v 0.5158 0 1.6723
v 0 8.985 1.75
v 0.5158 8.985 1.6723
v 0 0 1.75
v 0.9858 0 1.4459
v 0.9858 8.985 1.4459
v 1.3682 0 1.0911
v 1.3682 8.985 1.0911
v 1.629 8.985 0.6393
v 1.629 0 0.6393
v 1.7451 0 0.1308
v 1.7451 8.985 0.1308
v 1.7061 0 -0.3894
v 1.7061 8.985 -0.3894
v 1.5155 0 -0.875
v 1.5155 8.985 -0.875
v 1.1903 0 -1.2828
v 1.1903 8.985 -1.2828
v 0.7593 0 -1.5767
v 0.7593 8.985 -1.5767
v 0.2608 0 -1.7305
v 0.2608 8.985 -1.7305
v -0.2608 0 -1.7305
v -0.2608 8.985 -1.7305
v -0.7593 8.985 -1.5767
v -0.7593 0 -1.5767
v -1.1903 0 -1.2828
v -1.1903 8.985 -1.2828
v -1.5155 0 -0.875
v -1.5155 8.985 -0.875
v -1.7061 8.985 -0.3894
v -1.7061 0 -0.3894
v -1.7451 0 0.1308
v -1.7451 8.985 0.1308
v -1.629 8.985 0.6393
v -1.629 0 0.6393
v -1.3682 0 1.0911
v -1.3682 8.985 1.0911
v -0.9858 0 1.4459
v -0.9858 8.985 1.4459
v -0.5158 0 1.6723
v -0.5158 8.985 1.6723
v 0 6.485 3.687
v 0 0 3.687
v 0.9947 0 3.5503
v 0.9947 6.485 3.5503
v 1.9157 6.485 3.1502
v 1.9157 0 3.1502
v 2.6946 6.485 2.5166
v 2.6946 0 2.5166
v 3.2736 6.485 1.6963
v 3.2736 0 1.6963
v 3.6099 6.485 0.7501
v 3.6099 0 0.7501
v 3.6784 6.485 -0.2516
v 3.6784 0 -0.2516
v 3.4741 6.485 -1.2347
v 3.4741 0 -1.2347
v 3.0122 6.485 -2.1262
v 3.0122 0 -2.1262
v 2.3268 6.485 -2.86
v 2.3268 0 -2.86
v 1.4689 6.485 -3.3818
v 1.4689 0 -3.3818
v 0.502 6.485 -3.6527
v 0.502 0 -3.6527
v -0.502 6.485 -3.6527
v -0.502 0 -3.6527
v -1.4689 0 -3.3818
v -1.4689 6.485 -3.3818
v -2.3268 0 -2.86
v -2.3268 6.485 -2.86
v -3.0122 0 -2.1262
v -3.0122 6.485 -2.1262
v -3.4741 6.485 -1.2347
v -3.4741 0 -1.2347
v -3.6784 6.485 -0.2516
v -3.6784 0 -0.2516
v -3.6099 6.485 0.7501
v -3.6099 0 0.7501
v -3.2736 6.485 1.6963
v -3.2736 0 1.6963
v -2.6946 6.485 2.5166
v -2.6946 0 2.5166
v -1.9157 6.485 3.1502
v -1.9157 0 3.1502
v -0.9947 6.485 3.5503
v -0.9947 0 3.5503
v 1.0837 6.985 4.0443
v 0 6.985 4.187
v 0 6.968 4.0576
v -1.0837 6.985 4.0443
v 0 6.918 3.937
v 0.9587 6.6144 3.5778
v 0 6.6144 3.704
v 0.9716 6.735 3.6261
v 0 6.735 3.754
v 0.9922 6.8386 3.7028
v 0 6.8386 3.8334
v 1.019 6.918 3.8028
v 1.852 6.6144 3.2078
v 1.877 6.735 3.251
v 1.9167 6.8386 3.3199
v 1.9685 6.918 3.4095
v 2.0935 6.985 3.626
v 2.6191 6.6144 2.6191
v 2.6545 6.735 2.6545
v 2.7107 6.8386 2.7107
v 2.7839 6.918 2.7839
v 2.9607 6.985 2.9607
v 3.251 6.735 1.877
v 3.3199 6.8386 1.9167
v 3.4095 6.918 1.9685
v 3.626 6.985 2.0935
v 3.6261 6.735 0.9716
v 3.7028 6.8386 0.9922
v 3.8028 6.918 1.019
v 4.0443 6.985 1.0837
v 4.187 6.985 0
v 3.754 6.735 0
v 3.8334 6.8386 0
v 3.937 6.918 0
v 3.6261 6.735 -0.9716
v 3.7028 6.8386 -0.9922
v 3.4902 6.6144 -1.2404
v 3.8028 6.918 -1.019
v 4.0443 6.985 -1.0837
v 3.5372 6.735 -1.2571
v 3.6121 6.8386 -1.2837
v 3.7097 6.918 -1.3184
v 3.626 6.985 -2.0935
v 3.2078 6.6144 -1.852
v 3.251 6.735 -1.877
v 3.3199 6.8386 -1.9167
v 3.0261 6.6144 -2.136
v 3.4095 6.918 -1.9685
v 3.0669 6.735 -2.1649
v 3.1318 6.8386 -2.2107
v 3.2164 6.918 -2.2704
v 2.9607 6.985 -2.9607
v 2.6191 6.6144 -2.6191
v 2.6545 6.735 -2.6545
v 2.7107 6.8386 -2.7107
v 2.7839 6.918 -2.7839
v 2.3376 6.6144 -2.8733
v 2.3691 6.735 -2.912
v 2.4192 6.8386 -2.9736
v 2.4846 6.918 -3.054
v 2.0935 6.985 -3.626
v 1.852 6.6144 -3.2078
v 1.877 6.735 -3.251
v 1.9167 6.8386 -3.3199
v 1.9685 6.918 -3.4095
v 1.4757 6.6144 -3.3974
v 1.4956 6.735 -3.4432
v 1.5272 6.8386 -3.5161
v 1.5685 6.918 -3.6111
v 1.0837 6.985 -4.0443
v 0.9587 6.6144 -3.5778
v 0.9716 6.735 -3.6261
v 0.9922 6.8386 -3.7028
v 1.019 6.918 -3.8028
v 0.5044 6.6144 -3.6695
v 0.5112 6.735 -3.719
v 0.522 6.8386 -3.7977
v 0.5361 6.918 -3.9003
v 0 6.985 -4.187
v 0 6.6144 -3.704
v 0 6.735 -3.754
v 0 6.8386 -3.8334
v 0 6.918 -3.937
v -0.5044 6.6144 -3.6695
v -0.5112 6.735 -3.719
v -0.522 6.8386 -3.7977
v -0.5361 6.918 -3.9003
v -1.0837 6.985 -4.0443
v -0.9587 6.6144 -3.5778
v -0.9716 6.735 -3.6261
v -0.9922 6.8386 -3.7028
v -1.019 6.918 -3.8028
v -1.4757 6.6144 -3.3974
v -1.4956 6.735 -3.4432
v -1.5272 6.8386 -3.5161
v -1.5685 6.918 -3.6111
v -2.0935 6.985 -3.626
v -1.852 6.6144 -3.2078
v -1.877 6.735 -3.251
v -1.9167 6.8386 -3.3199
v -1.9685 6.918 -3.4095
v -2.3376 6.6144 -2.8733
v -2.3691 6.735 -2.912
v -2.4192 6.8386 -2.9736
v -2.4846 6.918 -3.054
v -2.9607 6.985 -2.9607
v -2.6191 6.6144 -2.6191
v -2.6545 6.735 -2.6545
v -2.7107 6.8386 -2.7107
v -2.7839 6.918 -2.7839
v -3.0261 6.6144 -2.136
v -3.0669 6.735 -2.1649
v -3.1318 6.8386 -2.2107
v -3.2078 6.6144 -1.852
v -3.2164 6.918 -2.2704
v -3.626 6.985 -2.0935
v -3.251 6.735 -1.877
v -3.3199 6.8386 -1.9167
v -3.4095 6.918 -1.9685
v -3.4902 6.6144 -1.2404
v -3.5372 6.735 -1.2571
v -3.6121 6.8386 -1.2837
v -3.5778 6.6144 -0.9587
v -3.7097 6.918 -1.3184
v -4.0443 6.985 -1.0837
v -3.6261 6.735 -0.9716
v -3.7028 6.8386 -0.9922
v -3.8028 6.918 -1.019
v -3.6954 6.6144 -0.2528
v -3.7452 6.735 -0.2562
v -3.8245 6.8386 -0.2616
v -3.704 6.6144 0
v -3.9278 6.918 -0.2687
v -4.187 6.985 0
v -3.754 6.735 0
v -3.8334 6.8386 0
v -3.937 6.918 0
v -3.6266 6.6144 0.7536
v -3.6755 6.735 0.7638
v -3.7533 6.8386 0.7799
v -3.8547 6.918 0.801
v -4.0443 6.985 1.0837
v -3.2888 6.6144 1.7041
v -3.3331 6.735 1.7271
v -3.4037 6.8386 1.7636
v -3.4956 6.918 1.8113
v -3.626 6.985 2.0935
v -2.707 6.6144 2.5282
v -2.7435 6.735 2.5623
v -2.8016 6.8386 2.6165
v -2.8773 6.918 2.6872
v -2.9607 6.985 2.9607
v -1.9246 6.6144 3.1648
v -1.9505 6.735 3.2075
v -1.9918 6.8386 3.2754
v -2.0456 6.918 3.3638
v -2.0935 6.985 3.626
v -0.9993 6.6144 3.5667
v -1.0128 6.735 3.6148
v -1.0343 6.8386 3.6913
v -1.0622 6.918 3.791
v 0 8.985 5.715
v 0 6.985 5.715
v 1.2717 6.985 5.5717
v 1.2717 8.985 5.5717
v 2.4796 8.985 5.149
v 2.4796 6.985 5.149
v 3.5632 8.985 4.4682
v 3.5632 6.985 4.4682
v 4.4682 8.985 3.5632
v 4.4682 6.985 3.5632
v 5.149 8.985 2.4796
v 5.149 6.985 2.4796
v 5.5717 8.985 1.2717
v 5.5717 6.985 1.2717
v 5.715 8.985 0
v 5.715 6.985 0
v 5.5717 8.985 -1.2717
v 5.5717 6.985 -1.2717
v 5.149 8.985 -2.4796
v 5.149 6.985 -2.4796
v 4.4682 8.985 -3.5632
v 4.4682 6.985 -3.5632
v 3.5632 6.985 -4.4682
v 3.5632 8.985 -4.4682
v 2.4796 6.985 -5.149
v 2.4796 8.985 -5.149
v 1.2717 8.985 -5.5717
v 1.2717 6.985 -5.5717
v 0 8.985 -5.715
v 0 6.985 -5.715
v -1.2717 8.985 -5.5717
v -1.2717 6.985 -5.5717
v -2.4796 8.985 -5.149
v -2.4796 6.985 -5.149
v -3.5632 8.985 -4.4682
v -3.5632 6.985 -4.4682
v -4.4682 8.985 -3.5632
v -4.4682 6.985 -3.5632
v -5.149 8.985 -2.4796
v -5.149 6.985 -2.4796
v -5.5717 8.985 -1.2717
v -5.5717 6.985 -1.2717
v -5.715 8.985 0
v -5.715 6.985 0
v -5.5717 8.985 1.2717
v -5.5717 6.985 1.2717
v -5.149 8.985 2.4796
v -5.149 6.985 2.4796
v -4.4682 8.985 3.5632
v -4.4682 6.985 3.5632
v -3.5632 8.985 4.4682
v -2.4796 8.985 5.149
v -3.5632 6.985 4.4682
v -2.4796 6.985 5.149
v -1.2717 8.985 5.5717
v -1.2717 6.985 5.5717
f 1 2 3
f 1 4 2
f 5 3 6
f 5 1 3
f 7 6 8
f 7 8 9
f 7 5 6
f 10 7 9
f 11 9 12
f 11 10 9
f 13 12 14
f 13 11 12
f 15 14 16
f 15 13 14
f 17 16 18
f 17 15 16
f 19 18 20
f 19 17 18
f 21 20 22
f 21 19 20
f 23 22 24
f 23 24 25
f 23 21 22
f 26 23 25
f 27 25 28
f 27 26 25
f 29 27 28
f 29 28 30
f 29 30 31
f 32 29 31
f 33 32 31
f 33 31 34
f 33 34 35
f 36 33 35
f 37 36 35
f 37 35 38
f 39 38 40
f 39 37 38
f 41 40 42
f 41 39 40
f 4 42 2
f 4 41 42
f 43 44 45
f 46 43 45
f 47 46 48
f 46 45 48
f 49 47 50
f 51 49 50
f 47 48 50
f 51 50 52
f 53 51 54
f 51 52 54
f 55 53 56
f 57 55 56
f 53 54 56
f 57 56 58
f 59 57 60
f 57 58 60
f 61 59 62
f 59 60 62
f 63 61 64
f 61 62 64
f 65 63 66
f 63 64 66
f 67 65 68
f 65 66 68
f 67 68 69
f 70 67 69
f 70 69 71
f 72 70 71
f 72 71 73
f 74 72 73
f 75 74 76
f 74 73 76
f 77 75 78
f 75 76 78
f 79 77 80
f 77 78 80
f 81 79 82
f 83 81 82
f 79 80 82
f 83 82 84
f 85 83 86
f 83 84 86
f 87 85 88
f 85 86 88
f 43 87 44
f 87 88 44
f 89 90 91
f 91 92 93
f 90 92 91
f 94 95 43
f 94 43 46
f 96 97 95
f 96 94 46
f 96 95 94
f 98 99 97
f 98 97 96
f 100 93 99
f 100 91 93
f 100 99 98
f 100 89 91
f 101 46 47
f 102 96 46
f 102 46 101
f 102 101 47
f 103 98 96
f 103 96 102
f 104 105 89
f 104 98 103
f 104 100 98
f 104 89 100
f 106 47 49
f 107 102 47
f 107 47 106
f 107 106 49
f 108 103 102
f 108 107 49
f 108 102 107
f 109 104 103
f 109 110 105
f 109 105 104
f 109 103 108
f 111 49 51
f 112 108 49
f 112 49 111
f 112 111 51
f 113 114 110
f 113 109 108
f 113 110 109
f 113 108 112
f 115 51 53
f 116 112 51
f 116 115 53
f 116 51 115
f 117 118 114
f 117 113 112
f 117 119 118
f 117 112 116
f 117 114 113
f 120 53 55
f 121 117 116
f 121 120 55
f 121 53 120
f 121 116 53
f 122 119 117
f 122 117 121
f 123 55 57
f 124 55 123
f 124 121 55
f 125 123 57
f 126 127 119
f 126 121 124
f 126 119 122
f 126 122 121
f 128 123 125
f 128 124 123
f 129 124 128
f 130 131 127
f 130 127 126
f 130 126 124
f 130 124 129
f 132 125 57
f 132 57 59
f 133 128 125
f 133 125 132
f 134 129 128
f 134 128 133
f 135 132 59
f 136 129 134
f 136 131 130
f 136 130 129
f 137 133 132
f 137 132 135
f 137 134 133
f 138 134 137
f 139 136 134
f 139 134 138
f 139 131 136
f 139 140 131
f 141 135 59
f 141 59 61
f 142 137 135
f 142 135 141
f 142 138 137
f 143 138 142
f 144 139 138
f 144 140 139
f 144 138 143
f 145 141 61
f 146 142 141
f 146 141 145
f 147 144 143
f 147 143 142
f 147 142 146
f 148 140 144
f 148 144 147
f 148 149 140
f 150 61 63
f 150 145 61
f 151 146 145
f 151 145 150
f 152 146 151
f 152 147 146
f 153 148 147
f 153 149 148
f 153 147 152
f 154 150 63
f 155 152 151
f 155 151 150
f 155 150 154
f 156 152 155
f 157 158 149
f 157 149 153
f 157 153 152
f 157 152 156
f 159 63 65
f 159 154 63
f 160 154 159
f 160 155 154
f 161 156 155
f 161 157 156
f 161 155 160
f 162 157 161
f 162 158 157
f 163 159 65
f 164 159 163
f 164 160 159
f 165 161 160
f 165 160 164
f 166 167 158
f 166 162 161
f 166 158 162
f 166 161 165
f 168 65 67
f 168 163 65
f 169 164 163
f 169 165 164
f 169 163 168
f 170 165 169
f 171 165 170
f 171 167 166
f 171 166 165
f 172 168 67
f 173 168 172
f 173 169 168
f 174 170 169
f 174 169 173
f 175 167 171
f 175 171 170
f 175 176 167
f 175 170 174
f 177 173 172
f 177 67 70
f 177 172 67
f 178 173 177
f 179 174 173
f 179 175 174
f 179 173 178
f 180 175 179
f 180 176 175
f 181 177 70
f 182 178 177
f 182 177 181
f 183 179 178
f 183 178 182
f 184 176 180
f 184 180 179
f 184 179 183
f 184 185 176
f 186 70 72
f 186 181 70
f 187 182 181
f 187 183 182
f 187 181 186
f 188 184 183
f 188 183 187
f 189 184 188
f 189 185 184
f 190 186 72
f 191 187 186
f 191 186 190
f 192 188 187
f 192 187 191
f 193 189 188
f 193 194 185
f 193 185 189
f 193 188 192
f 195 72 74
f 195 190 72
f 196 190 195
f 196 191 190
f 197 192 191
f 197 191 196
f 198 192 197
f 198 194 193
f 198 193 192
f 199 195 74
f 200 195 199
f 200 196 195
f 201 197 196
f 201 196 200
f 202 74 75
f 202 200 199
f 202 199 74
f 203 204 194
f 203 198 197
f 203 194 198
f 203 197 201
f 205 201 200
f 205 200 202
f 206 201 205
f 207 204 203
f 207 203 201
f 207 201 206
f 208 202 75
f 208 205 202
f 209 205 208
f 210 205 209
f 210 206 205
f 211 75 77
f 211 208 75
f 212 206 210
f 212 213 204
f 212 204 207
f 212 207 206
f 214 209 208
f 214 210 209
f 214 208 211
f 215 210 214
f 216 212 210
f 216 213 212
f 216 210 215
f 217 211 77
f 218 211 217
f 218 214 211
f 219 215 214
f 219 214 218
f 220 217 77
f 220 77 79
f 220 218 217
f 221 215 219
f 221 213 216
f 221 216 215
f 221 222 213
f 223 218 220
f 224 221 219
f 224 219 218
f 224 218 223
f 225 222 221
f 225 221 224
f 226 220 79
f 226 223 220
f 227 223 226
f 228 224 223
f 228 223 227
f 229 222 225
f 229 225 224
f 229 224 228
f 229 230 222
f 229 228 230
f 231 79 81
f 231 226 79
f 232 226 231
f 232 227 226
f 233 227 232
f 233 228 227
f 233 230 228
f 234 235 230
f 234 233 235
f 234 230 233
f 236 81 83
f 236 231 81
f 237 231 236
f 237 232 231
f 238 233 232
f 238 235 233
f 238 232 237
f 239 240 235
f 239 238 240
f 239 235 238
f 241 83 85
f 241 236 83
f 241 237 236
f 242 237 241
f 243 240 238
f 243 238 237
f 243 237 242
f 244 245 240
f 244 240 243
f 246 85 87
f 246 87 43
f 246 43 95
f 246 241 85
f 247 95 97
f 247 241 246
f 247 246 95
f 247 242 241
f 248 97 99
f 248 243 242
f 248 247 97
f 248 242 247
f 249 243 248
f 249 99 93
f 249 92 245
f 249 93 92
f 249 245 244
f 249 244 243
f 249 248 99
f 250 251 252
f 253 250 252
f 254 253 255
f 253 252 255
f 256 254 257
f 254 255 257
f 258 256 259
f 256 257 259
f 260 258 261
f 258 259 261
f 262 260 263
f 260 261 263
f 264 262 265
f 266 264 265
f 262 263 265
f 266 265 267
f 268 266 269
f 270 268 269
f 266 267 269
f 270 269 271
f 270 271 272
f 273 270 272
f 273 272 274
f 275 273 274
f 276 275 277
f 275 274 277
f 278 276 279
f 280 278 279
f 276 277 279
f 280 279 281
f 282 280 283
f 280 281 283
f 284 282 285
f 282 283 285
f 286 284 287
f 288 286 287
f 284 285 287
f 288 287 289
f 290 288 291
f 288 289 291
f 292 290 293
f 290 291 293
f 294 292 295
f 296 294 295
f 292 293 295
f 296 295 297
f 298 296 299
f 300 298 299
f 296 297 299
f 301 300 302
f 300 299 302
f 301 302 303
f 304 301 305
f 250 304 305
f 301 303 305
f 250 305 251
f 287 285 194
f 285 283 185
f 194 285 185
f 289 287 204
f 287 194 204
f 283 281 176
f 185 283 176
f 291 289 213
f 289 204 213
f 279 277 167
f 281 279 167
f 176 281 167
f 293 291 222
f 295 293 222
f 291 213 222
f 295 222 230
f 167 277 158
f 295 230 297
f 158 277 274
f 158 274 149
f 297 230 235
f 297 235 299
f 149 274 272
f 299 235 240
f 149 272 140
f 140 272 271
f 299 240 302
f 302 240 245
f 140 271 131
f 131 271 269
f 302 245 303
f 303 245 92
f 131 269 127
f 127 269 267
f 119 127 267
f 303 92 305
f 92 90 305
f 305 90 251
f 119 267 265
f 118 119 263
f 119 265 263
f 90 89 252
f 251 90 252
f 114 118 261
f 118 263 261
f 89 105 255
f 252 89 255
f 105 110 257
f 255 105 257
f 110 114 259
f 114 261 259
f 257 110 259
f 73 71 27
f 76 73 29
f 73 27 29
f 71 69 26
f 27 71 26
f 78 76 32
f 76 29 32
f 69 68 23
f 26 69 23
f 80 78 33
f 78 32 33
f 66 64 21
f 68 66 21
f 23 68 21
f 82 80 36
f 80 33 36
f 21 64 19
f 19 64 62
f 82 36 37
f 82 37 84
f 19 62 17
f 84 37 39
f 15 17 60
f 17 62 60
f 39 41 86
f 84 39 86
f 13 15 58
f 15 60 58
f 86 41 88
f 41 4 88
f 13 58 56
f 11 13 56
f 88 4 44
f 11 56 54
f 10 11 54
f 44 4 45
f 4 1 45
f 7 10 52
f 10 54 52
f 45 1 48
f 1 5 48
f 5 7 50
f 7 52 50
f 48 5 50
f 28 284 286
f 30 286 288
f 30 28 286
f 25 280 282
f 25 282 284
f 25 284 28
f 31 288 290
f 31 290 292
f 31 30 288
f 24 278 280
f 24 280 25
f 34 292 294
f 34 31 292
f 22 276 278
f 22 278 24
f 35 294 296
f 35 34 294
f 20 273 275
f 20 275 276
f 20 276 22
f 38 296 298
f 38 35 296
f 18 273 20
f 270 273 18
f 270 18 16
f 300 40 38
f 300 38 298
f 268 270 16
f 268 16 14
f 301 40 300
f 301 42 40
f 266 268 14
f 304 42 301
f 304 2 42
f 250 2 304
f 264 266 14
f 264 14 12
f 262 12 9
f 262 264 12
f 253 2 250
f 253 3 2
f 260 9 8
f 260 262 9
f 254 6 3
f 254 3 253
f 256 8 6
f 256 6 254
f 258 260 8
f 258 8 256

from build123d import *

# Parameters (mm, degrees)
SKETCH1_R           = 3.687
SKETCH1_R_2         = 1.75
BOSS_EXTRUDE1_DEPTH = 6.985
SKETCH2_R           = 5.715
SKETCH2_R_2         = 1.75
BOSS_EXTRUDE2_DEPTH = 2
FILLET1_R           = 0.5


with BuildPart() as part:
    # Sketch1 → Boss-Extrude1 (new body)
    with BuildSketch(Plane(origin=(0, 0, 0), x_dir=(1, 0, 0), z_dir=(0, 1, 0))):
        with Locations(Location((0, 0, 0), (0, 0, 270))):
            Circle(SKETCH1_R)
        with Locations(Location((0, 0, 0), (0, 0, 270))):
            Circle(SKETCH1_R_2, mode=Mode.SUBTRACT)
    extrude(amount=BOSS_EXTRUDE1_DEPTH)

    # Sketch2 → Boss-Extrude2 (add)
    with BuildSketch(Plane(origin=(0, 6.985, 0), x_dir=(1, 0, 0), z_dir=(0, 1, 0))):
        with Locations(Location((0, 0, 0), (0, 0, 270))):
            Circle(SKETCH2_R)
        with Locations(Location((0, 0, 0), (0, 0, 270))):
            Circle(SKETCH2_R_2, mode=Mode.SUBTRACT)
    extrude(amount=BOSS_EXTRUDE2_DEPTH)

    # Fillet1
    fillet1_edges = [part.edges().sort_by_distance(p)[0] for p in [
        (0, 6.985, -3.687),
    ]]
    fillet(fillet1_edges, radius=FILLET1_R)


solid = part.part
